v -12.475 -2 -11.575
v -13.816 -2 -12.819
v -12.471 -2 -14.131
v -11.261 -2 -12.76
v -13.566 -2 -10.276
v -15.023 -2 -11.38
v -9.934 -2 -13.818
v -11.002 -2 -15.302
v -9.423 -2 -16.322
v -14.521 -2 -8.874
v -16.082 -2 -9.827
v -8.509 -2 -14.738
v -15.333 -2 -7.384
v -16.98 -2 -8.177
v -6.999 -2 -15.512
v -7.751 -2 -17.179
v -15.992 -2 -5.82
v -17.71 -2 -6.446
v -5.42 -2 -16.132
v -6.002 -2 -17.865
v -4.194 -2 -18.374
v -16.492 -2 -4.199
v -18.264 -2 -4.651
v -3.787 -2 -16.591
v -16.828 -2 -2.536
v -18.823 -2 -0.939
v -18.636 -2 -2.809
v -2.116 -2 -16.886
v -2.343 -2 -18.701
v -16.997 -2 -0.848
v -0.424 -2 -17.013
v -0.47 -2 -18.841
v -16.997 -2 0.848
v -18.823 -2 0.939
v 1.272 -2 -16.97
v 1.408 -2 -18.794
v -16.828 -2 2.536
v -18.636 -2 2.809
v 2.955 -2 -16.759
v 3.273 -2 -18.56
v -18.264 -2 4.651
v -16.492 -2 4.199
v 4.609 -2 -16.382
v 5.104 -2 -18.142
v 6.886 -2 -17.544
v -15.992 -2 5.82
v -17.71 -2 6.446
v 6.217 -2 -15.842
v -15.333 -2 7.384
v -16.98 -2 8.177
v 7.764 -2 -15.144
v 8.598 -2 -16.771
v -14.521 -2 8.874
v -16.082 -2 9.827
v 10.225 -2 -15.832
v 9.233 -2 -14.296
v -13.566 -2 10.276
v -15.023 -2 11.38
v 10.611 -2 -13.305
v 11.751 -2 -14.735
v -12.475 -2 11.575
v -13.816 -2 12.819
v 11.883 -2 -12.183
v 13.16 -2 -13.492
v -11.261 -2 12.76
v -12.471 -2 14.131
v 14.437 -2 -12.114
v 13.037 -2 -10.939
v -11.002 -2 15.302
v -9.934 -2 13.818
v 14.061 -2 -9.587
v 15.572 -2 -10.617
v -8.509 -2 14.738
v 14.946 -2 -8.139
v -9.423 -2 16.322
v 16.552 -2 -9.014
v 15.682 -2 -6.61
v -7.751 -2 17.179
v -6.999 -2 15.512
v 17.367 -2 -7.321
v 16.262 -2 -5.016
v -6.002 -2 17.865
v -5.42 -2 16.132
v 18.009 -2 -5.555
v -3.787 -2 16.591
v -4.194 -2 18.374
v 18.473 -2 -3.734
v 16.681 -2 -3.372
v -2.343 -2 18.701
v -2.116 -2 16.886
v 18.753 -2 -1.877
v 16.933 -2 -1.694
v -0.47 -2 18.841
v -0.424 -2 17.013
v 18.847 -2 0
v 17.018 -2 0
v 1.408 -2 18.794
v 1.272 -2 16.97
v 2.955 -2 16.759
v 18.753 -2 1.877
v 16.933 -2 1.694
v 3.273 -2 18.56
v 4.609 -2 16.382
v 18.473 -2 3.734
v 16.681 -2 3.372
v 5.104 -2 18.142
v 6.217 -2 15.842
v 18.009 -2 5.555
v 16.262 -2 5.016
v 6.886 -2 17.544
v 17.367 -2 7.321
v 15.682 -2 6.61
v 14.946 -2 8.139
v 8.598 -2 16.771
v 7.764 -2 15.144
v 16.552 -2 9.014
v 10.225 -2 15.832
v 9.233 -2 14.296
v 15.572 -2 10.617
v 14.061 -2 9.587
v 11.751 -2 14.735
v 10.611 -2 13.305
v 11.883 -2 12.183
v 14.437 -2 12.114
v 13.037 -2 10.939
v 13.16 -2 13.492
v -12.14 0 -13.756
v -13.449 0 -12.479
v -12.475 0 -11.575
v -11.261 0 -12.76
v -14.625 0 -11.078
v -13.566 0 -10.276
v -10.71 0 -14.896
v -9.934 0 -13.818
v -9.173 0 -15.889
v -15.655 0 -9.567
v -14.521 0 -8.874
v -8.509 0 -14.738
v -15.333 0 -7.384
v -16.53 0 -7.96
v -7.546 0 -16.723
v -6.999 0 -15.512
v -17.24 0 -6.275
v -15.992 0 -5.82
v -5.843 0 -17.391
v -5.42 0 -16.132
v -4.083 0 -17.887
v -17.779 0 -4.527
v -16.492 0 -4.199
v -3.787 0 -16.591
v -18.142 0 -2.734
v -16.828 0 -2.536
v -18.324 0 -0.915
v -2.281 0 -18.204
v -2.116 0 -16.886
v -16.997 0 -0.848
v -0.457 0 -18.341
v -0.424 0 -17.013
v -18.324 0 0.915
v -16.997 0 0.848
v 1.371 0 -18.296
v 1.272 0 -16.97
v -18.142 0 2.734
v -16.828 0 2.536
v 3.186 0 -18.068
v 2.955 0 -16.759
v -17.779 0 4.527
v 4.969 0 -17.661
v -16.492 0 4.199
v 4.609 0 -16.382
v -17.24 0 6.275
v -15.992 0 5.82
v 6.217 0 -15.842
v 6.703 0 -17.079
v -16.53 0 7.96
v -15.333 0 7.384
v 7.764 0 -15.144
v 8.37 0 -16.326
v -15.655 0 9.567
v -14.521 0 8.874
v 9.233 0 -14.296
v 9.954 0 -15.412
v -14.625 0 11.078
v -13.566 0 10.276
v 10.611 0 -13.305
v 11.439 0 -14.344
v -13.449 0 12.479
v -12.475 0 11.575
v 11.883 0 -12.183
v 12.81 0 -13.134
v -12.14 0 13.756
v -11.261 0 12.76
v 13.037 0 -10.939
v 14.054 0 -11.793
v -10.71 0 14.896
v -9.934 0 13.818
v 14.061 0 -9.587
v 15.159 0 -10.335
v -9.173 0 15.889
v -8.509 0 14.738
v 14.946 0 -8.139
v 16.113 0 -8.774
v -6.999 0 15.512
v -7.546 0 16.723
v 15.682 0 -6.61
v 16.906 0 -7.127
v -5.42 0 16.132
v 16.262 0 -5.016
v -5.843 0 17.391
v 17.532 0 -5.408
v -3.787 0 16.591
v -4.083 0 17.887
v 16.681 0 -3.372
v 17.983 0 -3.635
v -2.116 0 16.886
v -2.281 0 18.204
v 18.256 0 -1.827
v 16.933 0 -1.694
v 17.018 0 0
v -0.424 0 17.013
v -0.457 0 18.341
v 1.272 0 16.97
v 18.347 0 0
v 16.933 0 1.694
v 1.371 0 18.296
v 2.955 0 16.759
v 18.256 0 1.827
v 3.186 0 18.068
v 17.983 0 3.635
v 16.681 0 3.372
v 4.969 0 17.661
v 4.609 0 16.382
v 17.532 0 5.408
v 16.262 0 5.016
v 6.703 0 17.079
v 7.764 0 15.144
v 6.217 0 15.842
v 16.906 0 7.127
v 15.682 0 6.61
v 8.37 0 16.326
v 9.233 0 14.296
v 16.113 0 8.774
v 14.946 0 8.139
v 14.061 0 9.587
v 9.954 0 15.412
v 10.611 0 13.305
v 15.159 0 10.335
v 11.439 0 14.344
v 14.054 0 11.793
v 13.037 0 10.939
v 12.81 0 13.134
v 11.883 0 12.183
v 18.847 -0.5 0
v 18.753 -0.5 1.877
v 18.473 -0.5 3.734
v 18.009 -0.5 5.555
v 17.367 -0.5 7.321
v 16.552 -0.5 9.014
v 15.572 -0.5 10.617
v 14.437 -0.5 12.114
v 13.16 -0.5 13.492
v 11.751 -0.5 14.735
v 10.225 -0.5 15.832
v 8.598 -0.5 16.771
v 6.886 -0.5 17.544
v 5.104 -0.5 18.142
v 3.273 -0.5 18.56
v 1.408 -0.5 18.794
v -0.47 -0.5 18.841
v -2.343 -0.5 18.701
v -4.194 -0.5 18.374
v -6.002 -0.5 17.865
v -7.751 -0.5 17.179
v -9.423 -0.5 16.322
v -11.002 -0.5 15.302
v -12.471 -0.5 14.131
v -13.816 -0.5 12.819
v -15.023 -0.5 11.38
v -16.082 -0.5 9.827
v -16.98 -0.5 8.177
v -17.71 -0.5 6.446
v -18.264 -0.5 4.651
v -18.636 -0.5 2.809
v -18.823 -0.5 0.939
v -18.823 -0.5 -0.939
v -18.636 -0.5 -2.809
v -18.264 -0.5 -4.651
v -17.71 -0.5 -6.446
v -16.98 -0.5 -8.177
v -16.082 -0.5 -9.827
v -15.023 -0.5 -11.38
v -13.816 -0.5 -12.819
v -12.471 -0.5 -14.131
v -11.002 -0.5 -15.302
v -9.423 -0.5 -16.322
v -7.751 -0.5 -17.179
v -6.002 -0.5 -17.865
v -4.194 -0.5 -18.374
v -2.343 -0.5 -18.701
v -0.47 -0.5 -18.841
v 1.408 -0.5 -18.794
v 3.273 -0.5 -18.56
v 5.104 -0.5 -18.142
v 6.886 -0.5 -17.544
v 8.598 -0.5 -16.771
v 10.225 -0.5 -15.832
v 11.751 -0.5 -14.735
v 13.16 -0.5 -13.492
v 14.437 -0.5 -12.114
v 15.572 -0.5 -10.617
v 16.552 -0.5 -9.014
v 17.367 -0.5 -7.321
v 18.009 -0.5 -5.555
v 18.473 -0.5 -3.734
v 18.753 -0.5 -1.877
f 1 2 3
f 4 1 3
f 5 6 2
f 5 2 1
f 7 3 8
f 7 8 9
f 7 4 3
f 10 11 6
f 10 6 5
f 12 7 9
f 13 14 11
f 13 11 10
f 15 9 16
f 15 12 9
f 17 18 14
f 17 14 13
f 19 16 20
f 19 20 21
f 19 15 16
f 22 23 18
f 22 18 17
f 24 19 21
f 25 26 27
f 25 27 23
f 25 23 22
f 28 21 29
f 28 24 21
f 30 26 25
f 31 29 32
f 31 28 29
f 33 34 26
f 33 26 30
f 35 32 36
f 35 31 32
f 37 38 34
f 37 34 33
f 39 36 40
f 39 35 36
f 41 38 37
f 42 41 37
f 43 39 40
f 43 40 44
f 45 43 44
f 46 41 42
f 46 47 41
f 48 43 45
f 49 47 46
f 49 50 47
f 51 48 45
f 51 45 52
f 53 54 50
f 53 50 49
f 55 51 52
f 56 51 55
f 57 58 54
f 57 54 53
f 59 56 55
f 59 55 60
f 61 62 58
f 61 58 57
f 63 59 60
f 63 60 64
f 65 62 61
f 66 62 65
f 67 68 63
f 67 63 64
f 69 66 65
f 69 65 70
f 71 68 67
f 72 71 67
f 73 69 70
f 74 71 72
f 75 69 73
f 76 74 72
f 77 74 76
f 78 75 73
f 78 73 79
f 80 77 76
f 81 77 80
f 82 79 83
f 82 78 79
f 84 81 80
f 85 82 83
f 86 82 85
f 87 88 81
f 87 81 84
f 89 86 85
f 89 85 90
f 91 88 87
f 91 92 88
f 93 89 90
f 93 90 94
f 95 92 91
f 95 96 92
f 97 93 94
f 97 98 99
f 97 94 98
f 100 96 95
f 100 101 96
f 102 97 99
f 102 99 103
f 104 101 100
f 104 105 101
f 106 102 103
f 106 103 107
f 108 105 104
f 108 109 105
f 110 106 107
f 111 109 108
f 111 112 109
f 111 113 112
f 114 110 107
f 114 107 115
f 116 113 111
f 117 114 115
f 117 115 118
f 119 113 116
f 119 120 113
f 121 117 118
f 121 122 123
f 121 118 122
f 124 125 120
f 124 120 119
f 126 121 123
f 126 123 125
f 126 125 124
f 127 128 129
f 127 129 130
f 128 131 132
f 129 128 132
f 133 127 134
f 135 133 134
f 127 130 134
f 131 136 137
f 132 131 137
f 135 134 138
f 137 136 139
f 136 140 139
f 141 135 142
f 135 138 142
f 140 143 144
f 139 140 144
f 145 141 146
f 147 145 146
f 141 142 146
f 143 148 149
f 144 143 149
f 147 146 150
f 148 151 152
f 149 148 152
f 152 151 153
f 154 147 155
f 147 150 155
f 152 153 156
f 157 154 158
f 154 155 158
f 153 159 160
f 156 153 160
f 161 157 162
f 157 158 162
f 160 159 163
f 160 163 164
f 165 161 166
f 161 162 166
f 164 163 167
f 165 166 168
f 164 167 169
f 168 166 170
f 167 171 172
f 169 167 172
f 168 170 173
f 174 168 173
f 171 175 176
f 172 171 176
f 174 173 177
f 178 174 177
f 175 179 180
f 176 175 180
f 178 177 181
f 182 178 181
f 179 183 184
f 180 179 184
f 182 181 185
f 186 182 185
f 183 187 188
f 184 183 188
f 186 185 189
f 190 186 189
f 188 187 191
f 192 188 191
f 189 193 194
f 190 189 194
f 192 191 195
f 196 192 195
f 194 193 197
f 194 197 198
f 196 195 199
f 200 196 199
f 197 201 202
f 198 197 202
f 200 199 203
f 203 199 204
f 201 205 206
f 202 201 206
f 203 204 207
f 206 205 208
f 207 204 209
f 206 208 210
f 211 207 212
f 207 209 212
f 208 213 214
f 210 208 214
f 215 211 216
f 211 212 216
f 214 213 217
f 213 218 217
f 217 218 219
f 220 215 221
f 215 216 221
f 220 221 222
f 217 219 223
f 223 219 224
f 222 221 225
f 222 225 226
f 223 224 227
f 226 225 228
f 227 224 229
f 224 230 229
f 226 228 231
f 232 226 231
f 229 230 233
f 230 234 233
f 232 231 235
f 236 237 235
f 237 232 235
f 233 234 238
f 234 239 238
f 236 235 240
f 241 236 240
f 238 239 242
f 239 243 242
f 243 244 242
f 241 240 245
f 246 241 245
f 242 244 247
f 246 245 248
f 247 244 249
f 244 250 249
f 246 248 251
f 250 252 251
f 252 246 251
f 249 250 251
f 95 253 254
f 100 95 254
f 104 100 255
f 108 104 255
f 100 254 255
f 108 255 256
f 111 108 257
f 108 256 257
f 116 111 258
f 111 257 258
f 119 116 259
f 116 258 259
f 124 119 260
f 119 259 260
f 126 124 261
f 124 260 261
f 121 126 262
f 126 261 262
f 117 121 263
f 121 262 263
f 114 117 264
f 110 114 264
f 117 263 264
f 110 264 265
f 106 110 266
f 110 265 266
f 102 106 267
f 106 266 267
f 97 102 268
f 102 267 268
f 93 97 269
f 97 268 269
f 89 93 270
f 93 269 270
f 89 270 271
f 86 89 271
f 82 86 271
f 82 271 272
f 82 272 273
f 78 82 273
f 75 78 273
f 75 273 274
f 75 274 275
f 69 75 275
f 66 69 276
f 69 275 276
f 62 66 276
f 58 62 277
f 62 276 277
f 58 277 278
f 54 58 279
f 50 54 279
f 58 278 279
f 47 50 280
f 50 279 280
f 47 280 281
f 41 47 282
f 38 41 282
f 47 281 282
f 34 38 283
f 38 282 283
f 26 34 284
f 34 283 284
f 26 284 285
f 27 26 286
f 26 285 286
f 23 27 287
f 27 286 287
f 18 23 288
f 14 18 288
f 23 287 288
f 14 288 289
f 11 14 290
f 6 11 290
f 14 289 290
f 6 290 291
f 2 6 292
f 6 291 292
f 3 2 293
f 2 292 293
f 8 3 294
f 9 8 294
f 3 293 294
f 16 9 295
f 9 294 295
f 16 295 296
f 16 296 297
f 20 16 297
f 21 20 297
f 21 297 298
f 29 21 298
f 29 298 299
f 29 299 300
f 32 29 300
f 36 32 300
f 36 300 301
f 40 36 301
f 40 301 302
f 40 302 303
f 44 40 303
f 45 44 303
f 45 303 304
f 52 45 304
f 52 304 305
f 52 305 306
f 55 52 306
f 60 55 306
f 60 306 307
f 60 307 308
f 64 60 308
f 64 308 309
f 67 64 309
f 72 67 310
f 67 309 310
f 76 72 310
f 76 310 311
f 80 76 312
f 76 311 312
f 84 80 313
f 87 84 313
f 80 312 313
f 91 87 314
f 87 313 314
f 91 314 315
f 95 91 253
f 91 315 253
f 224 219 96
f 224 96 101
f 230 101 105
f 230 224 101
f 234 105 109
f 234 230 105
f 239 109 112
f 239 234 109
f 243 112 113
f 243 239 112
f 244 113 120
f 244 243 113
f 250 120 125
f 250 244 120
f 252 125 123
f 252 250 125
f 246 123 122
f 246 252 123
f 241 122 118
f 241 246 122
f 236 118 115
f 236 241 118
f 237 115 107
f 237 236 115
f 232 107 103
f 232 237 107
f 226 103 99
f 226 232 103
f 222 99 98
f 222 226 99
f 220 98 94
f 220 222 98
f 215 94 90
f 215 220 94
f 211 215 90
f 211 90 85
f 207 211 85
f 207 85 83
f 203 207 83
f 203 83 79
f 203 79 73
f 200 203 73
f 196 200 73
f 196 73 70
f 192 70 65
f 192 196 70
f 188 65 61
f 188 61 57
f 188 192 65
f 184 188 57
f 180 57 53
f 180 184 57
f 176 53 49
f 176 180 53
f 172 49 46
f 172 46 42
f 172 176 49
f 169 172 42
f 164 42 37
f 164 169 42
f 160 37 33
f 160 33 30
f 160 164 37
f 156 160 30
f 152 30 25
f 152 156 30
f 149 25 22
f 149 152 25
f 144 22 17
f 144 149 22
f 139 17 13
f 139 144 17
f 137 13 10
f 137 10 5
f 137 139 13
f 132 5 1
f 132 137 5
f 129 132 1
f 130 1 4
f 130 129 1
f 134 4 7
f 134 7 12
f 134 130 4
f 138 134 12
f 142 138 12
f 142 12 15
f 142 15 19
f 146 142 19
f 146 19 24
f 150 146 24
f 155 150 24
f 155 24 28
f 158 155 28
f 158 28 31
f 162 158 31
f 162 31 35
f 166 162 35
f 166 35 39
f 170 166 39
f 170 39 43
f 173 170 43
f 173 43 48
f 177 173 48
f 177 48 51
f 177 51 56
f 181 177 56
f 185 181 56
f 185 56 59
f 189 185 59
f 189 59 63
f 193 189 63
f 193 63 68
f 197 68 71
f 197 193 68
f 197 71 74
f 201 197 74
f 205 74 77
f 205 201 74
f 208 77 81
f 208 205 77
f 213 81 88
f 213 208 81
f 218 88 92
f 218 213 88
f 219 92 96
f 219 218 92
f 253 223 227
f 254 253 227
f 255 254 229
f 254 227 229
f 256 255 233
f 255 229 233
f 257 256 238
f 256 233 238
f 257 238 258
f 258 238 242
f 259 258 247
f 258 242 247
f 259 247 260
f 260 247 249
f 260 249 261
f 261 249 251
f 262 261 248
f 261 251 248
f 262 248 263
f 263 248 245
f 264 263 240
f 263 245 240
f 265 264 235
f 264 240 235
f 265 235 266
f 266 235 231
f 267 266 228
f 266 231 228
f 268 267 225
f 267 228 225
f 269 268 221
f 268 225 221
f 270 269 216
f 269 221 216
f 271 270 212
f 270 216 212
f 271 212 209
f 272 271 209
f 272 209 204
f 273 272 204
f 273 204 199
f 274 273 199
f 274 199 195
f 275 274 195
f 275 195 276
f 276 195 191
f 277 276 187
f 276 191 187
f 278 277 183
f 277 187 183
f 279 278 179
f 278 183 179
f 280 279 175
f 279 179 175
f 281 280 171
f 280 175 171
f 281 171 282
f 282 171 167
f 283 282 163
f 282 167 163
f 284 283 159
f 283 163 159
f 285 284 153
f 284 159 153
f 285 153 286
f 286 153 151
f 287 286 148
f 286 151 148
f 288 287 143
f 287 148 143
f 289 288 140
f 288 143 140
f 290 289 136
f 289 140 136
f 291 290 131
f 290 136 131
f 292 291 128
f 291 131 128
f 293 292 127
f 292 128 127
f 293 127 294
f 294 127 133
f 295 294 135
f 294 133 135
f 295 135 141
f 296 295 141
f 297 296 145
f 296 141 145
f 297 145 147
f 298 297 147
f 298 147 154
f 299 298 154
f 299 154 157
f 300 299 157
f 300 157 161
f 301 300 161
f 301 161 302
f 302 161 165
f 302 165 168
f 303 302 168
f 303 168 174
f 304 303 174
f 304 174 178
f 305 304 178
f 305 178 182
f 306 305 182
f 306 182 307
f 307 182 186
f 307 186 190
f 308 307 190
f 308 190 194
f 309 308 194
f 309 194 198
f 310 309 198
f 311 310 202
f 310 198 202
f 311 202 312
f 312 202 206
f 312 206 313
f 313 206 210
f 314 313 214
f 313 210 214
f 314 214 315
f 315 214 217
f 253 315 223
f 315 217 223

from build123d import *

# Parameters (mm, degrees)
F0_R     = 17.018
F0_R_2   = 18.846805
F1_DEPTH = 2
F2_DEPTH = 25
F3_SIZE  = 0.5


with BuildPart() as f1:
    # F0 (on Front) → F1 (new body)
    with BuildSketch(Plane.XZ):
        Circle(F0_R)
        Circle(F0_R_2)
        Circle(F0_R, mode=Mode.SUBTRACT)
    extrude(amount=F1_DEPTH)

    # F0 (on Front) → F2 (cut)
    with BuildSketch(Plane.XZ):
        Circle(F0_R)
    extrude(amount=F2_DEPTH, mode=Mode.SUBTRACT)

    # F3
    f3_edges = [f1.edges().sort_by_distance(p)[0] for p in [
        (-18.846805, 0, 0),
    ]]
    chamfer(f3_edges, length=F3_SIZE)


solid = f1.part
